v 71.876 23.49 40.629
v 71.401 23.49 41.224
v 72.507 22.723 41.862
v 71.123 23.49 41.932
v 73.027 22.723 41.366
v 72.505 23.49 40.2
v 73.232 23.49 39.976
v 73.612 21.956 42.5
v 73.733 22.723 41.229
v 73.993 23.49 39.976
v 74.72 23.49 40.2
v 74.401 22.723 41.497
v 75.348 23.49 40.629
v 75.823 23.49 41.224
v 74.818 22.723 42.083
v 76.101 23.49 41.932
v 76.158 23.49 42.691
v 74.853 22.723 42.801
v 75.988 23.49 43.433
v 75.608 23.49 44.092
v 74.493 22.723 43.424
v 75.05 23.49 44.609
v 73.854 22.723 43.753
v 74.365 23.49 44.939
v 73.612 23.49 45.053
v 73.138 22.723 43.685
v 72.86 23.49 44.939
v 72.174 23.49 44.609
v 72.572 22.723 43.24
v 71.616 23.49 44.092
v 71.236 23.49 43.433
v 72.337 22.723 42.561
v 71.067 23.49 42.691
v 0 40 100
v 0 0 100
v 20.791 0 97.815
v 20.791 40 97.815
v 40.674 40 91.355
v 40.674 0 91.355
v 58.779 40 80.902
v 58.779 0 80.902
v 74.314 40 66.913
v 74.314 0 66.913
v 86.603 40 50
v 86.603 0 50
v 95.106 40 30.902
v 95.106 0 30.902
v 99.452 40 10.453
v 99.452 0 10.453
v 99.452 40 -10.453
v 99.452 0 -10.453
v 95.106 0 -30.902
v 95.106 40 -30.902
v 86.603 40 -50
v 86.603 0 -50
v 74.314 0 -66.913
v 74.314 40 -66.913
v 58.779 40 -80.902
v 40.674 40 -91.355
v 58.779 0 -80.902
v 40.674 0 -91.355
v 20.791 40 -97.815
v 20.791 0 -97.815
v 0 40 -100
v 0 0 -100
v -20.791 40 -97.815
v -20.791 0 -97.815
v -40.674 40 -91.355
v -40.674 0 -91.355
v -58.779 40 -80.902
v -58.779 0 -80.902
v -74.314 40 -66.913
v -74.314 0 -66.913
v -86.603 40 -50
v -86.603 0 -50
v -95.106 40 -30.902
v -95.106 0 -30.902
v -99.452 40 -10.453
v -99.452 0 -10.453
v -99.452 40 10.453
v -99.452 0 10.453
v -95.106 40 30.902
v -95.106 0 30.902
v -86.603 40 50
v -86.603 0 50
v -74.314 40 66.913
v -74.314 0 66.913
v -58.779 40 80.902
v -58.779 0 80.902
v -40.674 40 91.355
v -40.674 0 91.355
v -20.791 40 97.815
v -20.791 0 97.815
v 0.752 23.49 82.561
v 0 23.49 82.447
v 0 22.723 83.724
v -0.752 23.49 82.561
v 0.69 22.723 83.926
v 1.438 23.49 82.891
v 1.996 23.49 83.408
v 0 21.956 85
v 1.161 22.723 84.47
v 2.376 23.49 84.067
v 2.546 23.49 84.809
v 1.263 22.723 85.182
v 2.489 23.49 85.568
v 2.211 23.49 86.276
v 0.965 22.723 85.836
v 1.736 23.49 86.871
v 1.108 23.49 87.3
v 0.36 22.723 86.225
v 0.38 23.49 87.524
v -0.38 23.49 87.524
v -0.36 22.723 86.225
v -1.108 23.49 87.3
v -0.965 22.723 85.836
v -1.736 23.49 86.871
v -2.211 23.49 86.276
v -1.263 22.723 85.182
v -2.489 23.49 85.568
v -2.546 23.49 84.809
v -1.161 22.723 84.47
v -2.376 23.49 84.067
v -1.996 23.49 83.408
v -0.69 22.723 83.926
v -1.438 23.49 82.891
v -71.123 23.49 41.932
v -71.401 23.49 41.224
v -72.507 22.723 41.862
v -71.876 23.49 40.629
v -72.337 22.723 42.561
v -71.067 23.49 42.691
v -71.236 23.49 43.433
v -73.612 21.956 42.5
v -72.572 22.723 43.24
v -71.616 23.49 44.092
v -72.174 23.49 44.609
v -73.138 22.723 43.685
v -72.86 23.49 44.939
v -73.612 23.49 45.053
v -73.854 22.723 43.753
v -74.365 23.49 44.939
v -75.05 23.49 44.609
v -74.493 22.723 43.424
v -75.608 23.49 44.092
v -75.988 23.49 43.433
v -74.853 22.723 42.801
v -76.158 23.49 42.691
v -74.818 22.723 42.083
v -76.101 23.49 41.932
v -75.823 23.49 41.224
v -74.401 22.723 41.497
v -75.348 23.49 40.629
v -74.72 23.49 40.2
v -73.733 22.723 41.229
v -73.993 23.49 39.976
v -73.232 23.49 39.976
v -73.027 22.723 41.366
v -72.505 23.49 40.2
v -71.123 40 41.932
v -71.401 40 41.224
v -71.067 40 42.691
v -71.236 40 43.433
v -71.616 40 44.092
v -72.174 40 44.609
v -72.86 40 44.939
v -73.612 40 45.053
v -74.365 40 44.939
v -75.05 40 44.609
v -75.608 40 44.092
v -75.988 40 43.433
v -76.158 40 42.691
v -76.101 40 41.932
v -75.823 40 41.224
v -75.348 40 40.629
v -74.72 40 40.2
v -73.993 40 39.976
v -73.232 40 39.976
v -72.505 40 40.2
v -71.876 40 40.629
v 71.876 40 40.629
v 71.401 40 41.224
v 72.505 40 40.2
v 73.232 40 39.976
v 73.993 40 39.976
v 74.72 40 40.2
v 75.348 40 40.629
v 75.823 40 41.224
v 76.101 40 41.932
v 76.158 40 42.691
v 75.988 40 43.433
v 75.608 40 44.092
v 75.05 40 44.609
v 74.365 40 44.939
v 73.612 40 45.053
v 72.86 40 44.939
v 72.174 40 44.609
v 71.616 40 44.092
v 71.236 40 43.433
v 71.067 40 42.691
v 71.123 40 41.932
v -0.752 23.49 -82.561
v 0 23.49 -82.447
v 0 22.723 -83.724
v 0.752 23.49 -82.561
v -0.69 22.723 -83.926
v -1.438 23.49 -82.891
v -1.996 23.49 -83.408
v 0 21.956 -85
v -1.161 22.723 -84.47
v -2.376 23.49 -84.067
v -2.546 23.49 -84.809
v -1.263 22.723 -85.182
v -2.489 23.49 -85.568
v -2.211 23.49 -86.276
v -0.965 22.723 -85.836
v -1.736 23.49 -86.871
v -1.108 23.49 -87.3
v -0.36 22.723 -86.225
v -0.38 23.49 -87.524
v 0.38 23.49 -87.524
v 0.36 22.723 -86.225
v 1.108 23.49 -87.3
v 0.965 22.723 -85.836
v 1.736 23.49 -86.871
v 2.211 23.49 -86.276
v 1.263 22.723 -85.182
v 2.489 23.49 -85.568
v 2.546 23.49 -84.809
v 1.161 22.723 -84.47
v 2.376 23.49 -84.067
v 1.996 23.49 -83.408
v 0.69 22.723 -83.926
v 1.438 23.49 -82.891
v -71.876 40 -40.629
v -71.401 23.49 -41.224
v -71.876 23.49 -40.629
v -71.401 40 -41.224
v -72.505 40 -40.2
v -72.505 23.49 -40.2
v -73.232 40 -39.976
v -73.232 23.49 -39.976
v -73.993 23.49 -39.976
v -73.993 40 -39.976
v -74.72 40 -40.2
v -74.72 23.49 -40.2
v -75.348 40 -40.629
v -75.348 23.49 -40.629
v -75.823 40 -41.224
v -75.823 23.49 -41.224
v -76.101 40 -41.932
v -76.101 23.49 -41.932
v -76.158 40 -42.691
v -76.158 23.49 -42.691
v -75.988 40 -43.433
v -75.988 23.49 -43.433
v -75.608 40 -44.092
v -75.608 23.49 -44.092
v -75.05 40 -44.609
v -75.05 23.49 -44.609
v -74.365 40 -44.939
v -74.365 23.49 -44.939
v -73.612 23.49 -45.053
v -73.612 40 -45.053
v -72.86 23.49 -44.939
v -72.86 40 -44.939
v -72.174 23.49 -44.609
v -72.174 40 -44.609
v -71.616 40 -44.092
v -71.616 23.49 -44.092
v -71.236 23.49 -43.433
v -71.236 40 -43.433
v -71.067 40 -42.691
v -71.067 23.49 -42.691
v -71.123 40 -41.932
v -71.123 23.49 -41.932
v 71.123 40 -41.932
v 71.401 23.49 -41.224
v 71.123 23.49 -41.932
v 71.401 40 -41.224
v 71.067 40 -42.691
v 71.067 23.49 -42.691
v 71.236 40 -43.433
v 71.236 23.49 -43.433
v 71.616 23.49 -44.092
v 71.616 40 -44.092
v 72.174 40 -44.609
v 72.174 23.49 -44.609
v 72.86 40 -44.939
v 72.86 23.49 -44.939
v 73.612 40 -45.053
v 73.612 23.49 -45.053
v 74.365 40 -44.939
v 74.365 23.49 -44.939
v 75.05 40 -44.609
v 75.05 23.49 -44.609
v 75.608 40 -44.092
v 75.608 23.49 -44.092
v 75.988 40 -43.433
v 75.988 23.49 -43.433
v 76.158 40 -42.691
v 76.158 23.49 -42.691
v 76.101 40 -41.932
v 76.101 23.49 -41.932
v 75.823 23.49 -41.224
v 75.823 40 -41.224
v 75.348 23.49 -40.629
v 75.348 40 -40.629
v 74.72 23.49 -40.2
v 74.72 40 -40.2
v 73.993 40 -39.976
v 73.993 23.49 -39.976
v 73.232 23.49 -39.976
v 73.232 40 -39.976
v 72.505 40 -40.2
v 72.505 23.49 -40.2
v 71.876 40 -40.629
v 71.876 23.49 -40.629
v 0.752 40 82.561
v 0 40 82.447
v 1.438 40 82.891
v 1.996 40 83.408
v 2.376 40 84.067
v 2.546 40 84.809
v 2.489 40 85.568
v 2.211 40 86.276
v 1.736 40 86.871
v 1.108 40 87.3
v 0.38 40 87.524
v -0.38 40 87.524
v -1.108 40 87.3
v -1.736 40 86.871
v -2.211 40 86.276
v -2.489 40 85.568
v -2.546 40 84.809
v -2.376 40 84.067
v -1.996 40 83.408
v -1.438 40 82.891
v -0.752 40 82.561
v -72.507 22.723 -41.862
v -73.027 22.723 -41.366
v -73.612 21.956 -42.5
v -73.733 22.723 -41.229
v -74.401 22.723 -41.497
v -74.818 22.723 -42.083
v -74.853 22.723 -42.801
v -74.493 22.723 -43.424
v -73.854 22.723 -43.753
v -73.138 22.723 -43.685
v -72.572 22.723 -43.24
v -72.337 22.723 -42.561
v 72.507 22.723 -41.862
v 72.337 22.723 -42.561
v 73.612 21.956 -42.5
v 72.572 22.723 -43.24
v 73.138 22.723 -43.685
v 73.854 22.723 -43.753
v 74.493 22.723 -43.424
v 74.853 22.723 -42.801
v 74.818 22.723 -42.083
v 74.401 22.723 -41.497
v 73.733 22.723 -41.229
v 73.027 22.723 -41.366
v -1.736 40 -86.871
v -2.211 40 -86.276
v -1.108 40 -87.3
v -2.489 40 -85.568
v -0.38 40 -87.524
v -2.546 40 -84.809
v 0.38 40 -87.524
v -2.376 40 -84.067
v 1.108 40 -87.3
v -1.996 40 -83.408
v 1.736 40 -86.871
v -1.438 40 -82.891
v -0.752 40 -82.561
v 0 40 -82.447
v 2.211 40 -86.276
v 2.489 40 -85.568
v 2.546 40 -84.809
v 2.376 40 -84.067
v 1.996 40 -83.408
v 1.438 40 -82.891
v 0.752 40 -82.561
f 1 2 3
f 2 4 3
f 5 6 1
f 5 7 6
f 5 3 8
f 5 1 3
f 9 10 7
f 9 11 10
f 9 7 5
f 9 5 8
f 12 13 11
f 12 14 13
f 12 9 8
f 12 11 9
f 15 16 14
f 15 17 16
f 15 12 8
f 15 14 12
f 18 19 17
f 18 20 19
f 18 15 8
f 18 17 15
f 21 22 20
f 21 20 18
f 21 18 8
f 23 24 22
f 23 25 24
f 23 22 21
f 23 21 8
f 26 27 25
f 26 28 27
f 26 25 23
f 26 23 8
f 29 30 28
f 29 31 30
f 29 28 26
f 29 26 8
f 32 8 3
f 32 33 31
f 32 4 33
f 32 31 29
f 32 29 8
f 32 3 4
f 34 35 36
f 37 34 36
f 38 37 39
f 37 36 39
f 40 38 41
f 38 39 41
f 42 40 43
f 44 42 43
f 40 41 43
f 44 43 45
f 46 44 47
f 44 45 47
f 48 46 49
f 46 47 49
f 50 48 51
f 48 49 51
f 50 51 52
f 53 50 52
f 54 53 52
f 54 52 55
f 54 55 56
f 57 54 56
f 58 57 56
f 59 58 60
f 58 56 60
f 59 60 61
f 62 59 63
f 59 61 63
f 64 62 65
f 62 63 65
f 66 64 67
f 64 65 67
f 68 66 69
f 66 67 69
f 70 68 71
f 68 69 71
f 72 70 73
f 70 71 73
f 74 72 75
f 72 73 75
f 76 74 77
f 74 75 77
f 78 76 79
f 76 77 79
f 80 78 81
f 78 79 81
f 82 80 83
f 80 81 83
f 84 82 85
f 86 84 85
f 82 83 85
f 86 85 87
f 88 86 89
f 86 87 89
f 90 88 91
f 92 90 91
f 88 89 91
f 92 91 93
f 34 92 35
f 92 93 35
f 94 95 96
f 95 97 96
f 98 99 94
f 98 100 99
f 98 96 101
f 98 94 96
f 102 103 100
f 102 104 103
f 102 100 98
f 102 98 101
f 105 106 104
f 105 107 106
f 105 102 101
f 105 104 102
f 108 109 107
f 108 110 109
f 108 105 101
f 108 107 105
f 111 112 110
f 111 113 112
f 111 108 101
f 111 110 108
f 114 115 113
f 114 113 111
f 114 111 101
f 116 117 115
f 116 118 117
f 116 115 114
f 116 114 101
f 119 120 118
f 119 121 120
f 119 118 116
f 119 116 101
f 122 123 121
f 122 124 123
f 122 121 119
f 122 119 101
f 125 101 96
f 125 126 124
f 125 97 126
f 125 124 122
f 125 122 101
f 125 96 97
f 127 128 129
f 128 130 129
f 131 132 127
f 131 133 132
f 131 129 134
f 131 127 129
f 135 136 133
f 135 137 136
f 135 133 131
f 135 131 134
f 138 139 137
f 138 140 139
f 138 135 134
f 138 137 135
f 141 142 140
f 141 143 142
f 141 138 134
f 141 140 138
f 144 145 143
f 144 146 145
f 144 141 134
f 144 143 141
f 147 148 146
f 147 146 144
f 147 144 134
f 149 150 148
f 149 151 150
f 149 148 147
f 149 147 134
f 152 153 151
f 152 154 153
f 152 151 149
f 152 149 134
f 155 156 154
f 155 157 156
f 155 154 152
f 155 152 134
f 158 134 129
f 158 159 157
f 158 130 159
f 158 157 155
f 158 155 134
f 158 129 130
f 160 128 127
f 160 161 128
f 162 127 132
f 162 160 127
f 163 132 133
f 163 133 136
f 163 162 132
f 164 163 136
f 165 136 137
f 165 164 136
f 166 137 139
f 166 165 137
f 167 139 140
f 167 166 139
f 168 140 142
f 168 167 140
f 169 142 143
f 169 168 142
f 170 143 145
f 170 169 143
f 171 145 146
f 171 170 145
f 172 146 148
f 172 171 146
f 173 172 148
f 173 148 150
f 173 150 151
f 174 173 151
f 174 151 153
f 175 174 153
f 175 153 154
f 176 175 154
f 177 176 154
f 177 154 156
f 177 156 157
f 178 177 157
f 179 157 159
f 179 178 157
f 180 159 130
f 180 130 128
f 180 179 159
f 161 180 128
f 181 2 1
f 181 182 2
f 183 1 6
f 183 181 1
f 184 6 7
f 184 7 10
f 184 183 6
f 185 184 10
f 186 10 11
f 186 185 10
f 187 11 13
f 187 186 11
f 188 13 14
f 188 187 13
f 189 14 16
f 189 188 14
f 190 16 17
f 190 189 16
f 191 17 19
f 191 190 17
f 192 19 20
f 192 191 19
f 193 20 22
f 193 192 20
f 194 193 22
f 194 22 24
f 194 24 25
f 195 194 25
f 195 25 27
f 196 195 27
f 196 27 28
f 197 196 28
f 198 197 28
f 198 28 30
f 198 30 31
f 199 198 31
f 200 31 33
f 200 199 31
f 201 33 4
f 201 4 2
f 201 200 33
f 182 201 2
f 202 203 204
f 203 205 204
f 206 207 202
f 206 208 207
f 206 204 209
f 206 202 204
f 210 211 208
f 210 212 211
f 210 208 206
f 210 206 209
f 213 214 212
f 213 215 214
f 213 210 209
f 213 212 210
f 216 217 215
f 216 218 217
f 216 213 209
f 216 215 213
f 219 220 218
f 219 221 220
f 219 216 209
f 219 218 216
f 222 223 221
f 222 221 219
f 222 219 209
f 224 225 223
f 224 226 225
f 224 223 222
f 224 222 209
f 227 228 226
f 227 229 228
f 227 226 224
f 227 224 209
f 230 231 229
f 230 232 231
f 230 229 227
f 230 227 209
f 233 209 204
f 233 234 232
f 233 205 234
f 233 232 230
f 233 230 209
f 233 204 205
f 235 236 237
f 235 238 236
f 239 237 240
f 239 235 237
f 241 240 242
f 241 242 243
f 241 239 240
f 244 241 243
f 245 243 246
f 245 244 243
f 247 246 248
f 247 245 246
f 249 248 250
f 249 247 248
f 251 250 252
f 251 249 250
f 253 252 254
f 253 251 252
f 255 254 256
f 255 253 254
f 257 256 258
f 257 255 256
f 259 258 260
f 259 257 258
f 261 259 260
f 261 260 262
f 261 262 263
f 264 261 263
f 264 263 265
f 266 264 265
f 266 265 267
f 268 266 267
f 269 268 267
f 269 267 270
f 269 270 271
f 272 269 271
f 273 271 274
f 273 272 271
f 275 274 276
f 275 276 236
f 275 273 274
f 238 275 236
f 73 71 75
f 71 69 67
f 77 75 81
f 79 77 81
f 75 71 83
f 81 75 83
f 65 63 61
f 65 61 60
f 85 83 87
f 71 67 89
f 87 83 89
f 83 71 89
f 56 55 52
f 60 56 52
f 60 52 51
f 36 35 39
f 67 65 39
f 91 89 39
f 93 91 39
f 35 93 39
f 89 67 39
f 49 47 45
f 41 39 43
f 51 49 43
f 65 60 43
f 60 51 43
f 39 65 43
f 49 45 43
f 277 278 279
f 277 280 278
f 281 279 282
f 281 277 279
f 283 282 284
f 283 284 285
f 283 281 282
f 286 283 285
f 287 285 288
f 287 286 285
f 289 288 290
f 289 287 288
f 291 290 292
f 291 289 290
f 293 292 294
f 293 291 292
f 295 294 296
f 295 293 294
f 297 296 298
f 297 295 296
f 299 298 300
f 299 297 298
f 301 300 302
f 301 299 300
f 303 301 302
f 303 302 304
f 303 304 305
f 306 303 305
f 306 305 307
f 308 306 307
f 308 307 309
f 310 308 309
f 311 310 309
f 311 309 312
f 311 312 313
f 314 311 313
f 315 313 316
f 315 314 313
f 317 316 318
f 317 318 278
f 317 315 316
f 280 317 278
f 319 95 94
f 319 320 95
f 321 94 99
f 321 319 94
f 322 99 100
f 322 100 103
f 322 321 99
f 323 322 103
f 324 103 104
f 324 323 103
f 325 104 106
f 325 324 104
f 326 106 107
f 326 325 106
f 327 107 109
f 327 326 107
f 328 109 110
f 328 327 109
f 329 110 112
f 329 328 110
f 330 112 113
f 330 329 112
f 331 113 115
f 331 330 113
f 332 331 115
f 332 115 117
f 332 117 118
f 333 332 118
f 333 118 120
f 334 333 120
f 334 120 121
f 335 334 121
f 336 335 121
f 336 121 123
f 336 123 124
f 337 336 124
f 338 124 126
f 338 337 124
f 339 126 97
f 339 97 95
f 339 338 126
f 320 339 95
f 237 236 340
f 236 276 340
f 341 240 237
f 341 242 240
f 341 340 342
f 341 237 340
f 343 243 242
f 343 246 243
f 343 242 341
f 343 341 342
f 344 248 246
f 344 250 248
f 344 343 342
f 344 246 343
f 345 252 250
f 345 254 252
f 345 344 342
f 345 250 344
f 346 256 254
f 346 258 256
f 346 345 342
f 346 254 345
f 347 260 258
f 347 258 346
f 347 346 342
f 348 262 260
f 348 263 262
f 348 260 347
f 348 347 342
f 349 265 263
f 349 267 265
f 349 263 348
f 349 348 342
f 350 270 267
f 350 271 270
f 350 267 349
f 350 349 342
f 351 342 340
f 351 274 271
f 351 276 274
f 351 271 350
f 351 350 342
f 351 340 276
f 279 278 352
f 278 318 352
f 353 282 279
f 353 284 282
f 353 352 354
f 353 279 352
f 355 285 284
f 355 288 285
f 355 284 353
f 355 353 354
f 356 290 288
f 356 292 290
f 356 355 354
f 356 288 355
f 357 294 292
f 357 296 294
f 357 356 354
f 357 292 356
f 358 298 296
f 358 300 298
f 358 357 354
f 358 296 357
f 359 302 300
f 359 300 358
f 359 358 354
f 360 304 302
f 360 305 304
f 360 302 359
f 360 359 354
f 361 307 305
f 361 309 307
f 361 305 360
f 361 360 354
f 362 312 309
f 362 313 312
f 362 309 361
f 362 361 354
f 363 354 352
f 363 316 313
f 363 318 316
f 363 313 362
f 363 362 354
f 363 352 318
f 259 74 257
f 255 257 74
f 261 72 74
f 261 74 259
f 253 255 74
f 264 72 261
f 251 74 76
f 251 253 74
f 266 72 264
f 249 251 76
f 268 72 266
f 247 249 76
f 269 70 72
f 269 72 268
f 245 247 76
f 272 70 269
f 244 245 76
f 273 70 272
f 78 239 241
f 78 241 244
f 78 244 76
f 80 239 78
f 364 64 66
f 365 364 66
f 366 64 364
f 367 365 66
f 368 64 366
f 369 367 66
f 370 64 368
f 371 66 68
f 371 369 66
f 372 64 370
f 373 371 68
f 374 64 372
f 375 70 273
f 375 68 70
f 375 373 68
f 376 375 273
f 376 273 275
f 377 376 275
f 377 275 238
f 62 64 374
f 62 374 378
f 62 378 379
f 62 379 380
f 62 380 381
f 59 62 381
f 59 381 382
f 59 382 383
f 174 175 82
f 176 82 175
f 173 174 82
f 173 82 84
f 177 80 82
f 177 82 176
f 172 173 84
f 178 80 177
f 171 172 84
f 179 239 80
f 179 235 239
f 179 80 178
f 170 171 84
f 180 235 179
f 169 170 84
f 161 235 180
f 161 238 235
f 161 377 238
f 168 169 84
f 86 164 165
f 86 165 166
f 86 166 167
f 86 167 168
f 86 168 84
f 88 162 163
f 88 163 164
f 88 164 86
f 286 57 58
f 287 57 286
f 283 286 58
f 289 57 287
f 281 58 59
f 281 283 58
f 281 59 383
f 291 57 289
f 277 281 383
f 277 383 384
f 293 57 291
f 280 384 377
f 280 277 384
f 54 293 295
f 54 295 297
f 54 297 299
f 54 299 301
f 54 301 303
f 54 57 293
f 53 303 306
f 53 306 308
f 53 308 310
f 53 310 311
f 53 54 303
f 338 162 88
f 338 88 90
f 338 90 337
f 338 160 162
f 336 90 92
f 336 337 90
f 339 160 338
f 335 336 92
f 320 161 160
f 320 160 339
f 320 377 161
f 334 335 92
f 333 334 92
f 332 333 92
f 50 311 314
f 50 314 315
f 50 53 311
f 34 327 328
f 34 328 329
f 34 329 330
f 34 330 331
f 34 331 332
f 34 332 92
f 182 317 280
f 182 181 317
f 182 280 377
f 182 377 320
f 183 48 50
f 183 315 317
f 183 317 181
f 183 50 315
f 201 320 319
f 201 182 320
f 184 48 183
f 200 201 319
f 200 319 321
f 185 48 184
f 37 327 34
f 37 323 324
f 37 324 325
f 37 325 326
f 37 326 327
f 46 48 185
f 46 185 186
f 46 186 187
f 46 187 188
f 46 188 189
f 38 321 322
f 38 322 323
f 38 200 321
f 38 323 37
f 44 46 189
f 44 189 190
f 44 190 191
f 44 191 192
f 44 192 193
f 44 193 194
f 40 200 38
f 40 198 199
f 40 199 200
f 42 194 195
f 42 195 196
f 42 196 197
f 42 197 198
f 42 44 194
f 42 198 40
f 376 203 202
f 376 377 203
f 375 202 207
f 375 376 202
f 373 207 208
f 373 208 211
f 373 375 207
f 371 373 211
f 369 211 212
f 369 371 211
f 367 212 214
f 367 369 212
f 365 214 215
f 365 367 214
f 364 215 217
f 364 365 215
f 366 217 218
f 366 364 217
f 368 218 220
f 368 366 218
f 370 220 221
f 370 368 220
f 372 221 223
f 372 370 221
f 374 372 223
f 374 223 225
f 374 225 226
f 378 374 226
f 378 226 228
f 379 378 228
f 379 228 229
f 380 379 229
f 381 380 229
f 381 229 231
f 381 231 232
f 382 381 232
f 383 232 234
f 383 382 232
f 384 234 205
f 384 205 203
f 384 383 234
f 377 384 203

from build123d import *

# Parameters (mm, degrees)
SKETCH1_R           = 100
BOSS_EXTRUDE1_DEPTH = 40
CIRPATTERN1_COUNT   = 6


with BuildPart() as part:
    # Sketch1 → Boss-Extrude1 (new body)
    with BuildSketch(Plane(origin=(0, 0, 0), x_dir=(1, 0, 0), z_dir=(0, 1, 0))):
        with Locations(Location((0, 0, 0), (0, 0, 270))):
            Circle(SKETCH1_R)
    extrude(amount=BOSS_EXTRUDE1_DEPTH)

    # Sketch2 → 1/4-20 Tapped Hole1 (revolve, cut)
    with BuildSketch(Plane(origin=(0, 40, -85), x_dir=(0, 0, 1), z_dir=(1, 0, 0))):
        Polygon((0, 0), (0, 18.043816902), (2.5527, 16.51), (2.5527, 0), align=None)
    f_1_4_20_tapped_hole1 = revolve(axis=Axis((0, 46.35, -85), (0, -1, 0)), mode=Mode.SUBTRACT)

    # CirPattern1: 1/4-20 Tapped Hole1 ×6 about axis
    cirpattern1_axis = Axis((0, 0, 0), (0, 1, 0))
    for i in range(1, CIRPATTERN1_COUNT):
        add(f_1_4_20_tapped_hole1.rotate(cirpattern1_axis, i * 360 / CIRPATTERN1_COUNT), mode=Mode.SUBTRACT)


solid = part.part
